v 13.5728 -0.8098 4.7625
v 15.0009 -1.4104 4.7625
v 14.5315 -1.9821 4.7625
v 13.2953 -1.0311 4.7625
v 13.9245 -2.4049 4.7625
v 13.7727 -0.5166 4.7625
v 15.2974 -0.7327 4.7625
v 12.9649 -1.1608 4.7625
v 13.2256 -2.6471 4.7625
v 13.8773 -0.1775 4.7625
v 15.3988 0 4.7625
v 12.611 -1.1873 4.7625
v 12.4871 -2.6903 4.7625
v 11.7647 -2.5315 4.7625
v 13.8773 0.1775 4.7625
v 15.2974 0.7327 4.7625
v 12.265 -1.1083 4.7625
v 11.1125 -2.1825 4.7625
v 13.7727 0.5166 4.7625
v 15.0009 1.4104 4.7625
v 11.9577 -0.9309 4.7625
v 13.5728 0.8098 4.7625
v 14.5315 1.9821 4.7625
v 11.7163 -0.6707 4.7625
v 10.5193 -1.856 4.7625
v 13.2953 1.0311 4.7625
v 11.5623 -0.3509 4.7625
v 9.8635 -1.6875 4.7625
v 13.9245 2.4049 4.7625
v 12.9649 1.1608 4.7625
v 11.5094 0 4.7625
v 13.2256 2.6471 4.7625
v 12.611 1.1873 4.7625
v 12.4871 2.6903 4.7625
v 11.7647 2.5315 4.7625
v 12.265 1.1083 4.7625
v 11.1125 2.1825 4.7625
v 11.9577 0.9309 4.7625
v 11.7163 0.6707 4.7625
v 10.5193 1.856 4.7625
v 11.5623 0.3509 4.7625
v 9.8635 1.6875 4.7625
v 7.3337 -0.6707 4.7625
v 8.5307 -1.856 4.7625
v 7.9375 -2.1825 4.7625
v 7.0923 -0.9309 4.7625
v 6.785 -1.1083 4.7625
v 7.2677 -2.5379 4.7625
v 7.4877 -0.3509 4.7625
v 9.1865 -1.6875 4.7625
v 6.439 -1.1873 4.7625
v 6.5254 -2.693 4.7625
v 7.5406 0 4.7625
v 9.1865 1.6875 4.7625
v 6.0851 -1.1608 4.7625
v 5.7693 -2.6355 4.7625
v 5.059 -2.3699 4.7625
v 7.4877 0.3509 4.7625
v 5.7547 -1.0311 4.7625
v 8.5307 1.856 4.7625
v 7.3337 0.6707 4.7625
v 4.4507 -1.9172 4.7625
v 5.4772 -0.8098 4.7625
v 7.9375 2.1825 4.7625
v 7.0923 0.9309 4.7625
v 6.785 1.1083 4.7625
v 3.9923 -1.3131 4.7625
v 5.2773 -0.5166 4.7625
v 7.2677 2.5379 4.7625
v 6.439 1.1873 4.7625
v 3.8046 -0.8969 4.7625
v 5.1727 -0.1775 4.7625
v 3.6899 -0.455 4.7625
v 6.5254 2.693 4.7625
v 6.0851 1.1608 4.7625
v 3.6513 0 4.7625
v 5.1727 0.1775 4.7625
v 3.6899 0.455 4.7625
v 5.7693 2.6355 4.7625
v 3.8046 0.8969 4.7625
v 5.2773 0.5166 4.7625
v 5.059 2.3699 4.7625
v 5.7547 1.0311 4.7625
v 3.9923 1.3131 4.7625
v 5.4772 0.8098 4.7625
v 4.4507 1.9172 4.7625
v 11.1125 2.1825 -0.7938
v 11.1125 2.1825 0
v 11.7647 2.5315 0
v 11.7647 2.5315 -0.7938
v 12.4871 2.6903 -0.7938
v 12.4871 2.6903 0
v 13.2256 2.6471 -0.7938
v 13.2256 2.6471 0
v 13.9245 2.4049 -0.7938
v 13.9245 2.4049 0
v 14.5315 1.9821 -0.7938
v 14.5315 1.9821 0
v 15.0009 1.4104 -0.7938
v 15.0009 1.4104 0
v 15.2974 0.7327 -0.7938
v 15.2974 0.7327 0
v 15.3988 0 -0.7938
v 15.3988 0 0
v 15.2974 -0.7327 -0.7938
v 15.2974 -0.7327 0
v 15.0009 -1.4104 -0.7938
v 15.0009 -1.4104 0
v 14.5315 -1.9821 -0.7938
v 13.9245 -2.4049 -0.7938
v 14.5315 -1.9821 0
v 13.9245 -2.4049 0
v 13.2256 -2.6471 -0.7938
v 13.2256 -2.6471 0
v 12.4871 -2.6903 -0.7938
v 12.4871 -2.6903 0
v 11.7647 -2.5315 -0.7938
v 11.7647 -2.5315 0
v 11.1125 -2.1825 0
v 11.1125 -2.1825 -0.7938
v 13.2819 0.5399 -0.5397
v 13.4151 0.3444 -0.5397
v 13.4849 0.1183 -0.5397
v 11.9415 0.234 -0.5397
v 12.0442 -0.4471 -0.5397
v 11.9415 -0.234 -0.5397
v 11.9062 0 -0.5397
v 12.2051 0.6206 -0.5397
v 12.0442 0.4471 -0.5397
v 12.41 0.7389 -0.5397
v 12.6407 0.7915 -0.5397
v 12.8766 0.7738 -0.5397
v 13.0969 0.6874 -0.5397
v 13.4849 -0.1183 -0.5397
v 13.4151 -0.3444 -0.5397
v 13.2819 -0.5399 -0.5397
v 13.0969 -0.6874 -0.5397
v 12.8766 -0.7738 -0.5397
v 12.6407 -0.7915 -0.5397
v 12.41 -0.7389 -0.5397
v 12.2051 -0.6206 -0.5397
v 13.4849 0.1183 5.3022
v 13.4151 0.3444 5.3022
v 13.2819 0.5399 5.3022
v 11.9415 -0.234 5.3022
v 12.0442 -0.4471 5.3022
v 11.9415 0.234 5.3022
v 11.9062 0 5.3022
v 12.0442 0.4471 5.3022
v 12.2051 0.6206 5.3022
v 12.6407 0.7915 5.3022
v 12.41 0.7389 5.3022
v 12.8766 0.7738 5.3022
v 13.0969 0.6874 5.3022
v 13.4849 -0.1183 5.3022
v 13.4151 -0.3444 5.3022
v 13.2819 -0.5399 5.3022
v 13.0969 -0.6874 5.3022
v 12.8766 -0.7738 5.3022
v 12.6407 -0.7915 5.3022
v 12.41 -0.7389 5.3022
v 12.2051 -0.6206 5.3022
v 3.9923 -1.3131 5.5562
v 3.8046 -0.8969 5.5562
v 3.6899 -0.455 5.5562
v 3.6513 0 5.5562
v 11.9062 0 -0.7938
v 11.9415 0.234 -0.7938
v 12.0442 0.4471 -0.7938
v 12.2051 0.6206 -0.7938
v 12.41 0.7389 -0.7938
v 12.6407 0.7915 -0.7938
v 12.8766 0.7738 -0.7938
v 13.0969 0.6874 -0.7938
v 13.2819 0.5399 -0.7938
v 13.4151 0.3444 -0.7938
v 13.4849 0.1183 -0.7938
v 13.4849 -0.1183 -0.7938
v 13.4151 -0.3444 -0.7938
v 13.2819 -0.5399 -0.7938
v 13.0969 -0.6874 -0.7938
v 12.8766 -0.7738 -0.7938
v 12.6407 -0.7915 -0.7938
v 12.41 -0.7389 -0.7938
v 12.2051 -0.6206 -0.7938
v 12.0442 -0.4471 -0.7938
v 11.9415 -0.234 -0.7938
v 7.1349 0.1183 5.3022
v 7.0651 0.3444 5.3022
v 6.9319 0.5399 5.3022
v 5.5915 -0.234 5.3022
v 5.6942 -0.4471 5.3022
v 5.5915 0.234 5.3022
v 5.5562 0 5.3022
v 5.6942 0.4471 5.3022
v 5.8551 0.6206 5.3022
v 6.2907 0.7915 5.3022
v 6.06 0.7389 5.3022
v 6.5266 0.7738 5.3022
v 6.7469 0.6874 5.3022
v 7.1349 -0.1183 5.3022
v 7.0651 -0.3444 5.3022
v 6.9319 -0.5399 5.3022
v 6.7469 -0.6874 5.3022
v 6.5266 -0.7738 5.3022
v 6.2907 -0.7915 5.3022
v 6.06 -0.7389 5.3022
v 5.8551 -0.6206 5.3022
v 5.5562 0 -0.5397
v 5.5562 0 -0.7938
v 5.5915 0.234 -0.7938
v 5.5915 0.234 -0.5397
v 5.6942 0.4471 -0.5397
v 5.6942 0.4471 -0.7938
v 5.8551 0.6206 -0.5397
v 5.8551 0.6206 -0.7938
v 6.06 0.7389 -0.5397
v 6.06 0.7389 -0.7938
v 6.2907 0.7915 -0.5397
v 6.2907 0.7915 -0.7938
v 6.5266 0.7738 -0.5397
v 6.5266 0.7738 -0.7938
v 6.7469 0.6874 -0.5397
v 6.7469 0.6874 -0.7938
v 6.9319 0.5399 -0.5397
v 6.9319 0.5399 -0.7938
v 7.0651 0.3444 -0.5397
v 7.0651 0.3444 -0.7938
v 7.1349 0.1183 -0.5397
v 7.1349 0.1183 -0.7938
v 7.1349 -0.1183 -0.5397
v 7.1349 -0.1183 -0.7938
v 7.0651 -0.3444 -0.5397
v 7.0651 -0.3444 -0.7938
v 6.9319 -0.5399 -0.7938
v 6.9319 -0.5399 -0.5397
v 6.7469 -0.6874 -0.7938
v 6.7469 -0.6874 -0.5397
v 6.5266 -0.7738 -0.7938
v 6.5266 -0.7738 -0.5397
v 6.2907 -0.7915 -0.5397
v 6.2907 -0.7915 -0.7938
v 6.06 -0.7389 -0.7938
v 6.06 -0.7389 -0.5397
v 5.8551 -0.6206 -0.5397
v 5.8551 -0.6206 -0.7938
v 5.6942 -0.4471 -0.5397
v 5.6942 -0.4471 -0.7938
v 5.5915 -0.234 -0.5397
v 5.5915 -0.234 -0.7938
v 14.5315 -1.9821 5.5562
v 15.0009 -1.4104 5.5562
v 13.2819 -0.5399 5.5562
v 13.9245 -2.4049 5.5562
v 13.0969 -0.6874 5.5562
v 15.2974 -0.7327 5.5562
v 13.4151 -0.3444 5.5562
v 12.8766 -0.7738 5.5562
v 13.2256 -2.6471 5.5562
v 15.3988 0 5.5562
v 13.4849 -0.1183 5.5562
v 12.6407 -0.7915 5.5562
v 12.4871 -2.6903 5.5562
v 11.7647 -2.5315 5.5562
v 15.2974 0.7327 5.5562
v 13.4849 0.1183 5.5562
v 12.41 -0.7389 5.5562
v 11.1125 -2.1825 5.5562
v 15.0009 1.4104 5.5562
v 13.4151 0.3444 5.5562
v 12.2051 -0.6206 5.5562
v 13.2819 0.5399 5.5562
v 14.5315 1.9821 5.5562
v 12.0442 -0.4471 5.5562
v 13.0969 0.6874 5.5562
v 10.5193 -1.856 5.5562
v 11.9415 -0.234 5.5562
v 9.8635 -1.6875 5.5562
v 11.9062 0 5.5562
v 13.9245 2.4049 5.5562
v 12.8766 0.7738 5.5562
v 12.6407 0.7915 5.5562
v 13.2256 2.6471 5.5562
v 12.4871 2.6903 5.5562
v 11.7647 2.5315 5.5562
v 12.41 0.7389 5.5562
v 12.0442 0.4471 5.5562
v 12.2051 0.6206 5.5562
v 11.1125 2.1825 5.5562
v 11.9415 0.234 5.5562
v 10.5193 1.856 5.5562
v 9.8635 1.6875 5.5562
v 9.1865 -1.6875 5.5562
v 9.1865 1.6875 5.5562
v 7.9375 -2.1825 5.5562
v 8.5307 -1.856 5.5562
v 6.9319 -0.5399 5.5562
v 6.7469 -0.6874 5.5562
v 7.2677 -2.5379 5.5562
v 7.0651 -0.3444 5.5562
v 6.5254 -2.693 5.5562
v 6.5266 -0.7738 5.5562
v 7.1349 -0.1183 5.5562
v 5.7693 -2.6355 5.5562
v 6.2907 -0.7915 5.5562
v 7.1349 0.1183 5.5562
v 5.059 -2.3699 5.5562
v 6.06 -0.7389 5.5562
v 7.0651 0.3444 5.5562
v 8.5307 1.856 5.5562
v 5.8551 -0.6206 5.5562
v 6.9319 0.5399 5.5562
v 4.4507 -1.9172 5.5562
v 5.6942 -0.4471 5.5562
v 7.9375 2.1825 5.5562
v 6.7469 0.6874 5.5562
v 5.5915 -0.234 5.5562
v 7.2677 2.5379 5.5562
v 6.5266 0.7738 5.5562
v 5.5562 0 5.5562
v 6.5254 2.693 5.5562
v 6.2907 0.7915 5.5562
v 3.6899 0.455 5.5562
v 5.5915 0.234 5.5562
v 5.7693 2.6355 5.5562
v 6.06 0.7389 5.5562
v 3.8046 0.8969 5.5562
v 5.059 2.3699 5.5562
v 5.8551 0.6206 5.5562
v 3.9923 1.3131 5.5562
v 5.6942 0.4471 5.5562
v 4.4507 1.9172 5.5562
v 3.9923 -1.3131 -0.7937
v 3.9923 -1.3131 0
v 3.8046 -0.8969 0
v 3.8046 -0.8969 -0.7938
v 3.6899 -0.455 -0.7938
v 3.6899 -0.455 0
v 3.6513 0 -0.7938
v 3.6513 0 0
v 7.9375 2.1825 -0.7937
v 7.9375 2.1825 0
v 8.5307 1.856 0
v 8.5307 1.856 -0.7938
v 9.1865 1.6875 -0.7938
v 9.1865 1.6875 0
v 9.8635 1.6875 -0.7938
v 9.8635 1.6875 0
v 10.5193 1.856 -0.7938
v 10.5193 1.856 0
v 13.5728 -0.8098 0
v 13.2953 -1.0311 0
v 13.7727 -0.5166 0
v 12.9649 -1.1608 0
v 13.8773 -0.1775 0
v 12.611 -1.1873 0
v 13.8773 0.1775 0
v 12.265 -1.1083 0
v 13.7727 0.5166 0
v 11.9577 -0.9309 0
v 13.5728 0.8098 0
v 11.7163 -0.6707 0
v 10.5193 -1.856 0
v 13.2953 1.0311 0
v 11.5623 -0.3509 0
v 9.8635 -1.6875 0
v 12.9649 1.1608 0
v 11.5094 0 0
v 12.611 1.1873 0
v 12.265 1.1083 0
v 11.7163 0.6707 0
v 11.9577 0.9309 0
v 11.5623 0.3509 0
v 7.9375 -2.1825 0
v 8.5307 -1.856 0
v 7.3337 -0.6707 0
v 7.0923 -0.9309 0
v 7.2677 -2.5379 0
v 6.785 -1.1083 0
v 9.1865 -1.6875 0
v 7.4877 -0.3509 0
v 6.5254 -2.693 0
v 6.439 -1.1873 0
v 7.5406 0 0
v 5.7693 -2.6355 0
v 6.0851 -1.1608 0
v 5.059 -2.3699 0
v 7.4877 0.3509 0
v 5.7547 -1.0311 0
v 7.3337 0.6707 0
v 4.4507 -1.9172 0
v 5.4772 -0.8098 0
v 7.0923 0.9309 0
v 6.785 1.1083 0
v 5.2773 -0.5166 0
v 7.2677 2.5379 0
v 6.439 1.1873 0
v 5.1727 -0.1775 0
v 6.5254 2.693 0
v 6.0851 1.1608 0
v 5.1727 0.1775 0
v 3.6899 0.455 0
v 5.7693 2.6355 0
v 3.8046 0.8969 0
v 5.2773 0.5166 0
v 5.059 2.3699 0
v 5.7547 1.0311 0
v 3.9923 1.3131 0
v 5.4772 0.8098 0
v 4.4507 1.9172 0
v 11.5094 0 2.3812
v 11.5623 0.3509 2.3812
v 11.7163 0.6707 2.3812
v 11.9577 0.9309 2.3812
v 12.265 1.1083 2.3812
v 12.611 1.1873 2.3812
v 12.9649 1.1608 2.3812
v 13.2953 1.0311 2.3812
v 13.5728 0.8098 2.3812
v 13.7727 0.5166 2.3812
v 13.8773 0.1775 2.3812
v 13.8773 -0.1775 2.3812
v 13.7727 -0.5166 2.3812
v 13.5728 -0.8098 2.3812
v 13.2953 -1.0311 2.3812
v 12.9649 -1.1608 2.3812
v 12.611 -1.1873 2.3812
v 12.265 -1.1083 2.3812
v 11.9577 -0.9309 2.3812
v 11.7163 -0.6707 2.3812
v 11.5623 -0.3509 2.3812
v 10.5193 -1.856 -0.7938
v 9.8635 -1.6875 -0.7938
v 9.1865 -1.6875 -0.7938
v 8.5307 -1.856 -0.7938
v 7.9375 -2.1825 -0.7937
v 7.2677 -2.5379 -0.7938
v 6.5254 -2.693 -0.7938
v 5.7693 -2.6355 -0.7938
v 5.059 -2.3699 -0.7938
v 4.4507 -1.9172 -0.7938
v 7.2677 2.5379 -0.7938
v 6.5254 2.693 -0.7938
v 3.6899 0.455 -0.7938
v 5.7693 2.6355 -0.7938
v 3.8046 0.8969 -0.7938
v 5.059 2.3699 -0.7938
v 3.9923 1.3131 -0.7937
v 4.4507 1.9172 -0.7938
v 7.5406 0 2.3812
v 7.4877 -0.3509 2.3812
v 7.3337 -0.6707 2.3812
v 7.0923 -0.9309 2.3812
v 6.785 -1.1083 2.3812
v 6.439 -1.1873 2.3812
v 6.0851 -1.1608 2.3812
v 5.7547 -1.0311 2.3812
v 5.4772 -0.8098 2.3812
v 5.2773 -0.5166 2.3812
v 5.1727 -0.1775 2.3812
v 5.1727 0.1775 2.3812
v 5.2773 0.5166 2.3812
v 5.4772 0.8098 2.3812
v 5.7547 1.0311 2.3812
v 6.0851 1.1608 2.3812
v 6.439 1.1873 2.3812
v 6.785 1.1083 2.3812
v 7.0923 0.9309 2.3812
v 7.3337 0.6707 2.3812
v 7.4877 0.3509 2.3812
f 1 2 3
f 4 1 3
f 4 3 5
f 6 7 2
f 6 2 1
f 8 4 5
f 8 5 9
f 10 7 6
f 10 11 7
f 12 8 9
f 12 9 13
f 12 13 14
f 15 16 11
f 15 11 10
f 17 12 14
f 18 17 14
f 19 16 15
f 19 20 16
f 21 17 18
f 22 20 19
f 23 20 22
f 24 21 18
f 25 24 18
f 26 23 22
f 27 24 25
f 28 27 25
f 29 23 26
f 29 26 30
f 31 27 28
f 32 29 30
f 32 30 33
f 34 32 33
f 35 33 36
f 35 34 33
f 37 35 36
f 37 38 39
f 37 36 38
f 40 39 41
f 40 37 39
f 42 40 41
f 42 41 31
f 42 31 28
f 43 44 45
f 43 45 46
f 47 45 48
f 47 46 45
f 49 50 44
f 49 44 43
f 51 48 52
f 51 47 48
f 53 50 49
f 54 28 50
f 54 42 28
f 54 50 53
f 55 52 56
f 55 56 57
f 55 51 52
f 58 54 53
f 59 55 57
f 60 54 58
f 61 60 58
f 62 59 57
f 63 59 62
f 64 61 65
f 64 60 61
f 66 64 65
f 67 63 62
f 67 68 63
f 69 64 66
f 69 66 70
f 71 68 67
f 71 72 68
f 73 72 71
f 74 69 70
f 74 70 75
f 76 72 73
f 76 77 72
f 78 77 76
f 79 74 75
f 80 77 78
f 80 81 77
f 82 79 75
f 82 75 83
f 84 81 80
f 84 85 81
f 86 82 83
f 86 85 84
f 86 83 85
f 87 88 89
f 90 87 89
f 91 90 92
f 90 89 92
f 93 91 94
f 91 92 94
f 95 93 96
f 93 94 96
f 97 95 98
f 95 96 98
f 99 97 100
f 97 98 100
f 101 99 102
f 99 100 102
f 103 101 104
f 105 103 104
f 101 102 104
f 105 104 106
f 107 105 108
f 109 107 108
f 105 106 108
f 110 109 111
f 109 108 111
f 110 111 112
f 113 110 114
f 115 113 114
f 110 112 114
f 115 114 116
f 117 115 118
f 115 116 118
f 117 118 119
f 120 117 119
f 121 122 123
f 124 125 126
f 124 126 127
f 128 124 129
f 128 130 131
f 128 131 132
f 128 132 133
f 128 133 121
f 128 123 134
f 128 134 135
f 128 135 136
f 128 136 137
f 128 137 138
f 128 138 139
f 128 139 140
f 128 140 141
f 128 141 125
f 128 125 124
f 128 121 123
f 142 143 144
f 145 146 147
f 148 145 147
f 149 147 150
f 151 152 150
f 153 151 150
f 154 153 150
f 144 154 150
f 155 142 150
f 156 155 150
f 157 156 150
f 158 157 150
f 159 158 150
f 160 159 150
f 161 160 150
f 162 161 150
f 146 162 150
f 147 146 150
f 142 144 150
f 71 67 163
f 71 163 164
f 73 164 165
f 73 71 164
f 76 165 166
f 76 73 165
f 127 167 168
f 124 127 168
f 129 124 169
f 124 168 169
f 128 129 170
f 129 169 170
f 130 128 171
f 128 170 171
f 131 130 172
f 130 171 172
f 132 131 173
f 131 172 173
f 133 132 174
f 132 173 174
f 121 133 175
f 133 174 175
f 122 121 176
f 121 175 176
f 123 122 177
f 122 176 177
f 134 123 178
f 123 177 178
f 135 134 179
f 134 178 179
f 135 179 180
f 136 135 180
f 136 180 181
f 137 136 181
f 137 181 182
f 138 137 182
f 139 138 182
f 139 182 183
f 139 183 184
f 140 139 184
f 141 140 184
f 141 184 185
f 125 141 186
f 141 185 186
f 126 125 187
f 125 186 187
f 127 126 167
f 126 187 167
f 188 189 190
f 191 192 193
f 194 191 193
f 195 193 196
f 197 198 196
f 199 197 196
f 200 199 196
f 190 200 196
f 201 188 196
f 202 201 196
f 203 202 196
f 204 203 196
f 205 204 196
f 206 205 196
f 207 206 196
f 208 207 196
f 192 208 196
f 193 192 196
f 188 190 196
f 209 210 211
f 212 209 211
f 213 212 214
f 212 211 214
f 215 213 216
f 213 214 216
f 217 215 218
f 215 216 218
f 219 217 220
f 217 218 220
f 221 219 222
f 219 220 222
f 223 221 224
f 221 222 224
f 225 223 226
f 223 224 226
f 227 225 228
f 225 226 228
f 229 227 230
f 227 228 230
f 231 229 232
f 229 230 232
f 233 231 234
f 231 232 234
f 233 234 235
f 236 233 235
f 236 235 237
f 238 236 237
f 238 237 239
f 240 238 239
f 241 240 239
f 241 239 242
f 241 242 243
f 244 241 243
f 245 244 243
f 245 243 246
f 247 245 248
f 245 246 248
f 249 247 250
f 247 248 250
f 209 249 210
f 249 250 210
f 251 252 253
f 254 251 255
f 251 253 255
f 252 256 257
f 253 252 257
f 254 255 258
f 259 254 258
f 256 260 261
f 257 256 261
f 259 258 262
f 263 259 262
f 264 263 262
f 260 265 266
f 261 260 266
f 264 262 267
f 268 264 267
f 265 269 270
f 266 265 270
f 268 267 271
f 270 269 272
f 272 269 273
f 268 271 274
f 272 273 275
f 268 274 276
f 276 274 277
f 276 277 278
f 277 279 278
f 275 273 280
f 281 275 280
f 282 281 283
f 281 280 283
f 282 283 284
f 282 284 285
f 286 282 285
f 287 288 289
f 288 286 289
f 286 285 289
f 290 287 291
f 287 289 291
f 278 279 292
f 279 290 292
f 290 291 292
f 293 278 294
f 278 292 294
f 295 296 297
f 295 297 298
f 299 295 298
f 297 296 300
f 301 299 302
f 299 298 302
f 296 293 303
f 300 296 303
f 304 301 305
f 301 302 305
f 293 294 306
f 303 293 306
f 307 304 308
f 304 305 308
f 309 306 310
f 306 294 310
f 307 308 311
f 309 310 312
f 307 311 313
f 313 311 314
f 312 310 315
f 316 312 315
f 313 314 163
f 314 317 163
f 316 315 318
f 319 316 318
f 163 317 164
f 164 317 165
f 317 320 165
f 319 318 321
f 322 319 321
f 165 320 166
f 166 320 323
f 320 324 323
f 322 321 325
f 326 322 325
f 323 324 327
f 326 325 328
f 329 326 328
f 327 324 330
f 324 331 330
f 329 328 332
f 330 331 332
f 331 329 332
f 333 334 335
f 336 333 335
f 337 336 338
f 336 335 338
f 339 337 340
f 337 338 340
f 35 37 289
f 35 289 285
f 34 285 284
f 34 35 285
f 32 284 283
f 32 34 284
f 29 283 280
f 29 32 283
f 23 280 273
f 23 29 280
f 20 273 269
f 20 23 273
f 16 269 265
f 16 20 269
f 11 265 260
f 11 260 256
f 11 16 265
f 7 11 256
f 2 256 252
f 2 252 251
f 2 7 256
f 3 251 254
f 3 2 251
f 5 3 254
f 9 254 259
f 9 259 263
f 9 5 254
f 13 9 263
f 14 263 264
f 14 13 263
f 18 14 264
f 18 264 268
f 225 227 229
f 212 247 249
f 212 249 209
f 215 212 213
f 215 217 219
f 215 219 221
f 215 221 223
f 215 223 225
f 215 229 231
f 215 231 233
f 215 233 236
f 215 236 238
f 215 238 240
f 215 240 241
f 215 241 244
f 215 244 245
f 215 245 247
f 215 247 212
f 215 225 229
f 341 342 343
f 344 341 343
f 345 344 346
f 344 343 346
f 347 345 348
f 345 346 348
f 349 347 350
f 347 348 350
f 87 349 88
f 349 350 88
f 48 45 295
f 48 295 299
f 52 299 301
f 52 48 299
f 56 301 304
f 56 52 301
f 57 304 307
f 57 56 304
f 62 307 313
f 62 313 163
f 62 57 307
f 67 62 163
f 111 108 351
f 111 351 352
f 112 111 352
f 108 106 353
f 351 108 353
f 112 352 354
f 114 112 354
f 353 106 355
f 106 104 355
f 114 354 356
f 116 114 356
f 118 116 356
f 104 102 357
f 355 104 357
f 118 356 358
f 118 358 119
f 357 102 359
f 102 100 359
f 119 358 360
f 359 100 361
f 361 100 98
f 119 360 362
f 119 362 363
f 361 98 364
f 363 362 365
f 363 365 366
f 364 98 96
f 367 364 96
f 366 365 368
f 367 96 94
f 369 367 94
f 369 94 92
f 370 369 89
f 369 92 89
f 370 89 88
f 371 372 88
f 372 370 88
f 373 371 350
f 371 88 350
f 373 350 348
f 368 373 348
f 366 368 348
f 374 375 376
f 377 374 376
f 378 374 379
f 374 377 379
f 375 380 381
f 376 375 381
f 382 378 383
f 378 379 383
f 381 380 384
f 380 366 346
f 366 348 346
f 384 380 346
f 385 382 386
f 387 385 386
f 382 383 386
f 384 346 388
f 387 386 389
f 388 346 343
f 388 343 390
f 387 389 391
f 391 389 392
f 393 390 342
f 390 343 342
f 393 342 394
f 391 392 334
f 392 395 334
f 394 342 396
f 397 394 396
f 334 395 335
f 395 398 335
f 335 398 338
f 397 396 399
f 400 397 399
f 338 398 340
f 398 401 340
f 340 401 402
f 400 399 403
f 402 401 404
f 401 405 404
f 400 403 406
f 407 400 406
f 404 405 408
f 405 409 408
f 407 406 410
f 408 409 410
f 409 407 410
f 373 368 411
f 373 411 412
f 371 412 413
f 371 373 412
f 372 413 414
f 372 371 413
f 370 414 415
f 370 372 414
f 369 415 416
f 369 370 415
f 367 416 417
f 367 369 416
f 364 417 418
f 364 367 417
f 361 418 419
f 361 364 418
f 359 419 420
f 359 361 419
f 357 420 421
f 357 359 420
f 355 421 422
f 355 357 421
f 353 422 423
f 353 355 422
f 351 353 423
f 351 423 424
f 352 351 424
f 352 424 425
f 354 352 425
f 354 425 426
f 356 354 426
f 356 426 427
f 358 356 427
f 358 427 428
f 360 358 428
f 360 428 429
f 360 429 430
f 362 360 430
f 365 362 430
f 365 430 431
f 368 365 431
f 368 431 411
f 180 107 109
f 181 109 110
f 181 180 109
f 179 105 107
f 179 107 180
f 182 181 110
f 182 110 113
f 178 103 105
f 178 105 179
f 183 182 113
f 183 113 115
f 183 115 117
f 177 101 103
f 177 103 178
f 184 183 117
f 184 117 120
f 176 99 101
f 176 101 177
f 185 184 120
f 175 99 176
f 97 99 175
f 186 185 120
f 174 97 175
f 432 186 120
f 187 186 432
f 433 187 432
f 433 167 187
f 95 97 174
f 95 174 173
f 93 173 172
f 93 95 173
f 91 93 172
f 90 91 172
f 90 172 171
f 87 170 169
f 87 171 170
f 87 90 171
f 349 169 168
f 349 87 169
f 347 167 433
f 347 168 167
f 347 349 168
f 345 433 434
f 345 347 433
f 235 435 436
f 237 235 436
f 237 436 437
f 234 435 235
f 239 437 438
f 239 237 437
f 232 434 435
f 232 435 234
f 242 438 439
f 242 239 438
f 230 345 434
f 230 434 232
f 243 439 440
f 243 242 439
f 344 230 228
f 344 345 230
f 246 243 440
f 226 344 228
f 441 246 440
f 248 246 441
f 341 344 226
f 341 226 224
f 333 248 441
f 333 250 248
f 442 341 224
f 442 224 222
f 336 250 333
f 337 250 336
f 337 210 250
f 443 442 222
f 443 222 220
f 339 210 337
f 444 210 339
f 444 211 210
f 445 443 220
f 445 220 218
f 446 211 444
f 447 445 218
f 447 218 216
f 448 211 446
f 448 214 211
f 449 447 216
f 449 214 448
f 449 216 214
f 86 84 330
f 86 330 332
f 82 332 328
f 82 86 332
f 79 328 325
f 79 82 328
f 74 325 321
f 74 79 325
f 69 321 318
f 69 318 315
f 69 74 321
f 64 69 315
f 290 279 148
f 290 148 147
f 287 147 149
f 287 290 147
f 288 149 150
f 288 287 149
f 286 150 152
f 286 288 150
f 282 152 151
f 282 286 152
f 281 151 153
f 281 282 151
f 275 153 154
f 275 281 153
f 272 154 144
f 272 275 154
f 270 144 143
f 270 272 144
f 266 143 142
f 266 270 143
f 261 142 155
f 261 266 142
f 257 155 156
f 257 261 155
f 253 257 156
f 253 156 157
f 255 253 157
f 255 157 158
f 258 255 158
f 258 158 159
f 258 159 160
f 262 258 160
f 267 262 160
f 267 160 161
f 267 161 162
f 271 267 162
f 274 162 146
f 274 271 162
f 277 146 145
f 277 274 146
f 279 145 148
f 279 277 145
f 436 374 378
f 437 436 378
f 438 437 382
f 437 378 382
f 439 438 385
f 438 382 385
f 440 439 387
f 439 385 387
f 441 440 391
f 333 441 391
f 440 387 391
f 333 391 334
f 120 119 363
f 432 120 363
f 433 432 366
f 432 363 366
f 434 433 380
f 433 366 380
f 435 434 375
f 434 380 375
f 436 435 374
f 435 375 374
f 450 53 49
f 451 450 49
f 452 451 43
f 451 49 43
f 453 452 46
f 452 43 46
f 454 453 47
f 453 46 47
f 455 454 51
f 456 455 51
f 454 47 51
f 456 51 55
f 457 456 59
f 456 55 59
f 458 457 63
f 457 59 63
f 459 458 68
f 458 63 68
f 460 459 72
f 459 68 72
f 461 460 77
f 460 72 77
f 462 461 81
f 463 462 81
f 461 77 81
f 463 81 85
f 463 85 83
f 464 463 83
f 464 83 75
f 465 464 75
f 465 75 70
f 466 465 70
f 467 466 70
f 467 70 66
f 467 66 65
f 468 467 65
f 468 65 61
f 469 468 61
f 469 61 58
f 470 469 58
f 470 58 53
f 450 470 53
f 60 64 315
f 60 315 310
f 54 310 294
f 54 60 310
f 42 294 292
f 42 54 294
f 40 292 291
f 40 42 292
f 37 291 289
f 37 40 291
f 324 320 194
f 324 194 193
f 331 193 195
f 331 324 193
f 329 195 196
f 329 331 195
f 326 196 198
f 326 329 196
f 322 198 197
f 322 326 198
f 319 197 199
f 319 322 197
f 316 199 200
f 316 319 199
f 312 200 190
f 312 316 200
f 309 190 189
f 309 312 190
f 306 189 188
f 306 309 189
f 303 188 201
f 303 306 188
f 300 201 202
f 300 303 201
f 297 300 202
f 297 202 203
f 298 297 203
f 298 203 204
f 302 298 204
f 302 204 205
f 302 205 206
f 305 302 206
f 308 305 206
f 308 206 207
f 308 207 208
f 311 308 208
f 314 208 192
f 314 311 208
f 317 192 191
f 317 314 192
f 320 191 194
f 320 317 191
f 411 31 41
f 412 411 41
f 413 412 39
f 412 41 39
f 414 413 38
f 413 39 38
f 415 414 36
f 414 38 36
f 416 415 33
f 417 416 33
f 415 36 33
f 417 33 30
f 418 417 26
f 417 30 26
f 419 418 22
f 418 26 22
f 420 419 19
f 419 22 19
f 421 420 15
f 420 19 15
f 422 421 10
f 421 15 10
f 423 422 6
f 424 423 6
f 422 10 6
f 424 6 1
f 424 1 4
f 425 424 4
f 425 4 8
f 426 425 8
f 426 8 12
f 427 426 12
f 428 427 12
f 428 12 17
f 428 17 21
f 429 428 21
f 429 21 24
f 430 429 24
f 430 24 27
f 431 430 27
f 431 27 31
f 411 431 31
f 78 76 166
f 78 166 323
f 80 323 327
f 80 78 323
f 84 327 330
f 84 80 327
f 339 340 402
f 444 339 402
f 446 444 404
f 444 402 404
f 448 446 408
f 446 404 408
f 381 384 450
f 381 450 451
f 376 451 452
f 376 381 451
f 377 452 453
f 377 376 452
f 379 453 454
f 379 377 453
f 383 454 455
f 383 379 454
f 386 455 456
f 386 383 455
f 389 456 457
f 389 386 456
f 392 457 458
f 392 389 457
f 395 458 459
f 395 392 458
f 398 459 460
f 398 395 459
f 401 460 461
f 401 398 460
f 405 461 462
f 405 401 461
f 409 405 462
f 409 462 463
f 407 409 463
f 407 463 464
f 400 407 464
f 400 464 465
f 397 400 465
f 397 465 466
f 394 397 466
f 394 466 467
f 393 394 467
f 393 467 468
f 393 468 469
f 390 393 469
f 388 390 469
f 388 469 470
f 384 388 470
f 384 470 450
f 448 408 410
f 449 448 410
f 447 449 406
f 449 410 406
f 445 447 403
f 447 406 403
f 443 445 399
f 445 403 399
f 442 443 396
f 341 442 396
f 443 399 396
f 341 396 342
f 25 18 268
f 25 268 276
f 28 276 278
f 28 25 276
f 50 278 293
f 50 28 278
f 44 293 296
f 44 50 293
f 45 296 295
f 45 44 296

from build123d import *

# Parameters (mm, degrees)
SKETCH2_R           = 2.38125
SKETCH2_R_2         = 1.190625
BOSS_EXTRUDE1_DEPTH = 0.79375
SKETCH3_R           = 2.69875
SKETCH3_R_2         = 1.190625
BOSS_EXTRUDE2_DEPTH = 0.79375
BOSS_EXTRUDE3_START = 0.79375
SKETCH3_4_R         = 1.190625
BOSS_EXTRUDE3_DEPTH = 3.175
SKETCH4_R           = 0.79375
CUT_EXTRUDE1_DEPTH  = 0.254


with BuildPart() as part:
    # Sketch2 → Boss-Extrude1 (new body)
    # profile 1 of 3: a face of its own
    with BuildSketch(Plane.XY):
        Circle(SKETCH2_R)
        Circle(SKETCH2_R_2, mode=Mode.SUBTRACT)
    # profile 2 of 3: a face of its own
    with BuildSketch(Plane.XY):
        with BuildLine():
            ThreePointArc((1.5875, 1.774878957), (2.1737739, 0.972141242), (2.38125, 0))
            ThreePointArc((2.38125, 0), (2.1737739, -0.972141242), (1.5875, -1.774878957))
            ThreePointArc((1.5875, -1.774878957), (3.175, -1.168507914), (4.7625, -1.774878957))
            ThreePointArc((4.7625, -1.774878957), (3.96875, 0), (4.7625, 1.774878957))
            ThreePointArc((4.7625, 1.774878957), (3.175, 1.168507914), (1.5875, 1.774878957))
        make_face()
    # profile 3 of 3: a face of its own
    with BuildSketch(Plane.XY):
        with Locations((6.35, 0)):
            Circle(SKETCH2_R)
        with Locations((6.35, 0)):
            Circle(SKETCH2_R_2, mode=Mode.SUBTRACT)
    extrude(amount=BOSS_EXTRUDE1_DEPTH)


with BuildPart() as body_2:
    # Sketch3 → Boss-Extrude2 (new body)
    # profile 1 of 4: a face of its own
    with BuildSketch(Plane(origin=(0, 0, 0), x_dir=(-1, 0, 0), z_dir=(0, 0, -1))):
        with Locations((-12.7, 0)):
            Circle(SKETCH3_R)
        with Locations((-12.7, 0)):
            Circle(SKETCH3_R_2, mode=Mode.SUBTRACT)
    # profile 2 of 4: a face of its own
    with BuildSketch(Plane(origin=(0, 0, 0), x_dir=(-1, 0, 0), z_dir=(0, 0, -1))):
        with BuildLine():
            ThreePointArc((-3.65125, 0), (-3.737895814, 0.678353361), (-3.99226957, 1.313148424))
            ThreePointArc((-3.99226957, 1.313148424), (-4.399347966, 1.507376065), (-4.7625, 1.774878957))
            ThreePointArc((-4.7625, 1.774878957), (-8.73125, 0), (-4.7625, -1.774878957))
            ThreePointArc((-4.7625, -1.774878957), (-4.399347966, -1.507376065), (-3.99226957, -1.313148424))
            ThreePointArc((-3.99226957, -1.313148424), (-3.737895814, -0.678353361), (-3.65125, 0))
        make_face()
        with Locations(Location((-6.35, 0, 0), (0, 0, 180))):
            Circle(SKETCH3_R_2, mode=Mode.SUBTRACT)
    # profile 3 of 4: a face of its own
    with BuildSketch(Plane(origin=(0, 0, 0), x_dir=(-1, 0, 0), z_dir=(0, 0, -1))):
        with BuildLine():
            ThreePointArc((-3.99226957, 1.313148424), (-5.769279961, 2.63552951), (-7.9375, 2.182451675))
            ThreePointArc((-7.9375, 2.182451675), (-9.04875, 0), (-7.9375, -2.182451675))
            ThreePointArc((-7.9375, -2.182451675), (-5.769279961, -2.63552951), (-3.99226957, -1.313148424))
            ThreePointArc((-3.99226957, -1.313148424), (-4.399347966, -1.507376065), (-4.7625, -1.774878957))
            ThreePointArc((-4.7625, -1.774878957), (-8.73125, 0), (-4.7625, 1.774878957))
            ThreePointArc((-4.7625, 1.774878957), (-4.399347966, 1.507376065), (-3.99226957, 1.313148424))
        make_face()
    # profile 4 of 4: a face of its own
    with BuildSketch(Plane(origin=(0, 0, 0), x_dir=(-1, 0, 0), z_dir=(0, 0, -1))):
        with BuildLine():
            ThreePointArc((-7.9375, -2.182451675), (-9.04875, 0), (-7.9375, 2.182451675))
            ThreePointArc((-7.9375, 2.182451675), (-9.525, 1.666153349), (-11.1125, 2.182451675))
            ThreePointArc((-11.1125, 2.182451675), (-10.295055387, 1.224537859), (-10.00125, 0))
            ThreePointArc((-10.00125, 0), (-10.295055387, -1.224537859), (-11.1125, -2.182451675))
            ThreePointArc((-11.1125, -2.182451675), (-9.525, -1.666153349), (-7.9375, -2.182451675))
        make_face()
    extrude(amount=BOSS_EXTRUDE2_DEPTH)

    # Sketch3<4> → Boss-Extrude3 (add)
    with BuildSketch(Plane(origin=(0, 0, 0), x_dir=(-1, 0, 0), z_dir=(0, 0, -1)).offset(BOSS_EXTRUDE3_START)):
        with Locations(Location((-6.35, 0, 0), (0, 0, 180))):
            Circle(SKETCH3_4_R)
        with Locations((-12.7, 0)):
            Circle(SKETCH3_4_R)
    extrude(amount=-BOSS_EXTRUDE3_DEPTH)


with BuildPart() as body_3:
    # Mirror1: mirrored copy
    add(body_2.part.mirror(Plane(origin=(6.35, 0, 2.38125), x_dir=(1, 0, 0), z_dir=(0, 0, -1))))


with BuildPart() as body_4:
    # Mirror1 2: mirrored copy
    add(part.part.mirror(Plane(origin=(6.35, 0, 2.38125), x_dir=(1, 0, 0), z_dir=(0, 0, -1))))


with BuildPart() as body_2_1:
    add(body_2.part)

    # Combine1: union body 3
    add(body_3.part)

    # Sketch4 → Cut-Extrude1 (cut)
    with BuildSketch(Plane(origin=(0, 0, -0.79375), x_dir=(-1, 0, 0), z_dir=(0, 0, -1))):
        with Locations((-6.35, 0)):
            Circle(SKETCH4_R)
        with Locations((-12.7, 0)):
            Circle(SKETCH4_R)
    cut_extrude1 = extrude(amount=-CUT_EXTRUDE1_DEPTH, mode=Mode.SUBTRACT)

    # Mirror2: Cut-Extrude1 across plane
    add(cut_extrude1.mirror(Plane.XY.offset(2.38125)), mode=Mode.SUBTRACT)


solid = body_2_1.part
